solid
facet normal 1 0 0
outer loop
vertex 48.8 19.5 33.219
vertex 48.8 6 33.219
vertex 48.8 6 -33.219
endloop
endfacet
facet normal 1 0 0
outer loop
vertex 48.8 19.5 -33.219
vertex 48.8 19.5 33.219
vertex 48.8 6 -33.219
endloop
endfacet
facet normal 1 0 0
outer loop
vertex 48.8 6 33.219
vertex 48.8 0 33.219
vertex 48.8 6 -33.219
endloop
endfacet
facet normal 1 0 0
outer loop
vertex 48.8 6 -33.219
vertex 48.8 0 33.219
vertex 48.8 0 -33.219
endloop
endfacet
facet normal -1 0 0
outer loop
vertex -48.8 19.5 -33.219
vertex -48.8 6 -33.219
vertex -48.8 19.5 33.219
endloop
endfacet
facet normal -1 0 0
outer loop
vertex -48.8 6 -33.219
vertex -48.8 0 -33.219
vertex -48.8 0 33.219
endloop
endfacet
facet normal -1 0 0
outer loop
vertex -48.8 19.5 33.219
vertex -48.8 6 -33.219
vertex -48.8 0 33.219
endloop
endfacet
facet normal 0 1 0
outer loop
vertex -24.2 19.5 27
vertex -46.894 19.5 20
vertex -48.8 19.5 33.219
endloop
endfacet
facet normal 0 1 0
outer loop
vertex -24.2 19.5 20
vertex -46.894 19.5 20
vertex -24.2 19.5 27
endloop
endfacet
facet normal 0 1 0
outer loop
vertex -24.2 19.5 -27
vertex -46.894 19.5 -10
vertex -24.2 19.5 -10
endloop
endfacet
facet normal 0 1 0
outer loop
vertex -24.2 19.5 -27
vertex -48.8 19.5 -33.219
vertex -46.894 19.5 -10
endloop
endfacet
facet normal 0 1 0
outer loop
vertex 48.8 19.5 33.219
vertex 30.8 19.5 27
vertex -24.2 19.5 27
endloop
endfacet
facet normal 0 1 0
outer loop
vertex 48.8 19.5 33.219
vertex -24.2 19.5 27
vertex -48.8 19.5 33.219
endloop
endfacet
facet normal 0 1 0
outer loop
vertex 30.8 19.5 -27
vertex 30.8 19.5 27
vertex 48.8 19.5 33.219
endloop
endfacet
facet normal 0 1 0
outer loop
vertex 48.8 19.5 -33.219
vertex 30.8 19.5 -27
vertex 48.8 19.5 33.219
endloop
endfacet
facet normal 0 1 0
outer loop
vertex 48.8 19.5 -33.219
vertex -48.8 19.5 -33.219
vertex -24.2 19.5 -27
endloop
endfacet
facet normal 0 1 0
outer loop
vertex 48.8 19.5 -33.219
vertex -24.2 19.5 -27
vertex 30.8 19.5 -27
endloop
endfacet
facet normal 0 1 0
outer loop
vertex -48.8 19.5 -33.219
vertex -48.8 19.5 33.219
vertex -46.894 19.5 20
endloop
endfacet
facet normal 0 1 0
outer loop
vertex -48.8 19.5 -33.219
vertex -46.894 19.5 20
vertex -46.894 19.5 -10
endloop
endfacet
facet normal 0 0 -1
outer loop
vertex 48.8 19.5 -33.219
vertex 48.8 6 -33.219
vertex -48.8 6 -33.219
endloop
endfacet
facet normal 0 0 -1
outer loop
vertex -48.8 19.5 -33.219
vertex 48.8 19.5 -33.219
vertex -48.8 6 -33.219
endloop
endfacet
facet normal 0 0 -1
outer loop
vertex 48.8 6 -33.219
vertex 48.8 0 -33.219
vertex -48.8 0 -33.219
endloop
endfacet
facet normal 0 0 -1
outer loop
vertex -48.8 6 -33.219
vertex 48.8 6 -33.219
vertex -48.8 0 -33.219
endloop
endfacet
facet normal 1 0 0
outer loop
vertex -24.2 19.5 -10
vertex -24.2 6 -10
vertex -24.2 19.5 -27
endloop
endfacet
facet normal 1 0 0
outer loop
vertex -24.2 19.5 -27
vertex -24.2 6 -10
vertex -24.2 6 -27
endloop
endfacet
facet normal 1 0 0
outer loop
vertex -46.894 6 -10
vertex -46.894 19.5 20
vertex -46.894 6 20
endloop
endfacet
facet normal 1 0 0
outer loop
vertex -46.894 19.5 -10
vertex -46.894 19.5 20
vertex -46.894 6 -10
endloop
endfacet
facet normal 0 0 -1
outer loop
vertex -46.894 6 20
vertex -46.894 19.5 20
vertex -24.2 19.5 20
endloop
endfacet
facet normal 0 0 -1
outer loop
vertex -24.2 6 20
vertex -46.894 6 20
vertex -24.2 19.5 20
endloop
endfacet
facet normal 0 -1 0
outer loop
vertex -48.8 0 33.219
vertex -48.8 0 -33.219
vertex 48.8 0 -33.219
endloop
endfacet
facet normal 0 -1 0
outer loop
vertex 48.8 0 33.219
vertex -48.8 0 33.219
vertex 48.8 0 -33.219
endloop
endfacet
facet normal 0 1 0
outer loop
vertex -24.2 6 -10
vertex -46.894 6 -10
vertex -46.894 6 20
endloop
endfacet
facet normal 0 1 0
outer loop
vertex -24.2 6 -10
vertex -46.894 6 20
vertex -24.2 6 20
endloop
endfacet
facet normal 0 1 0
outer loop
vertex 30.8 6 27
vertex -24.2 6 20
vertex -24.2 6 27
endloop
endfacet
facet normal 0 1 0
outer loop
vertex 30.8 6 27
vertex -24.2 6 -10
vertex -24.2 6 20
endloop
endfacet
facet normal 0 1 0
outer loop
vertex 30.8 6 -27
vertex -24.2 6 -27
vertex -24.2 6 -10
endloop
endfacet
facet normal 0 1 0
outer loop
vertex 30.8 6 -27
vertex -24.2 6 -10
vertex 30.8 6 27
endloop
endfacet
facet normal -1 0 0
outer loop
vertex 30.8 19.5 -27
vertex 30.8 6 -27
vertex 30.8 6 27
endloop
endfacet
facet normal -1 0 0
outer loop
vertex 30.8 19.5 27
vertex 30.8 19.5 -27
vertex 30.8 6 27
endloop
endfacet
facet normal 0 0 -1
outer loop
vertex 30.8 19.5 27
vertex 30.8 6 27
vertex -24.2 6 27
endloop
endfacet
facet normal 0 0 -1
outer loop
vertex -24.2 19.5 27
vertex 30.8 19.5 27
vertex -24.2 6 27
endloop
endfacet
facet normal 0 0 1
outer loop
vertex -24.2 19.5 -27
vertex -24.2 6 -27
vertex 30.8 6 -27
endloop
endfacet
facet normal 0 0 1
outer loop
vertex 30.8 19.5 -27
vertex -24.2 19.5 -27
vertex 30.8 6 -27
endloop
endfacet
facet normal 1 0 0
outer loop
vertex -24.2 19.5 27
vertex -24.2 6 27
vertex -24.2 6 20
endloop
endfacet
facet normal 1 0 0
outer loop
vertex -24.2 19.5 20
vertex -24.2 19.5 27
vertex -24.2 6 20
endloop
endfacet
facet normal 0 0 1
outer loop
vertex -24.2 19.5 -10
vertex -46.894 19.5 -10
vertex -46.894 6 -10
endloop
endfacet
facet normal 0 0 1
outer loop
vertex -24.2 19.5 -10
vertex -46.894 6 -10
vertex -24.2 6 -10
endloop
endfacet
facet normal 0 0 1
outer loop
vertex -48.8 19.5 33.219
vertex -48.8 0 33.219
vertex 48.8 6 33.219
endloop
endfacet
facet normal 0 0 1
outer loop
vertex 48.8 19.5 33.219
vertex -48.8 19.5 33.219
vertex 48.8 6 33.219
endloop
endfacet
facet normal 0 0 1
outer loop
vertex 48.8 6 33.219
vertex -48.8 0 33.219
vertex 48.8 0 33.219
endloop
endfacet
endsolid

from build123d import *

# Parameters (mm, degrees)
SKETCH1_W           = 97.6
SKETCH1_H           = 66.43745389
BOSS_EXTRUDE1_DEPTH = 6
SKETCH4_W           = 24.6
SKETCH4_H           = 54
SKETCH4_H_2         = 6.218726945
SKETCH4_W_2         = 55
SKETCH4_W_3         = 18
BOSS_EXTRUDE2_DEPTH = 13.5
SKETCH5_W           = 34.693830492
SKETCH5_H           = 30
CUT_EXTRUDE1_DEPTH  = 13.5


with BuildPart() as part:
    # Sketch1 → Boss-Extrude1 (new body)
    with BuildSketch(Plane(origin=(0, 0, 0), x_dir=(1, 0, 0), z_dir=(0, 1, 0))):
        Rectangle(SKETCH1_W, SKETCH1_H)
    extrude(amount=BOSS_EXTRUDE1_DEPTH)

    # Sketch4 → Boss-Extrude2 (add)
    with BuildSketch(Plane(origin=(0, 6, 0), x_dir=(1, 0, 0), z_dir=(0, 1, 0))):
        with Locations((-36.5, 0)):
            Rectangle(SKETCH4_W, SKETCH4_H)
        with Locations((-36.5, -30.109363473)):
            Rectangle(SKETCH4_W, SKETCH4_H_2)
        with Locations((3.3, -30.109363473)):
            Rectangle(SKETCH4_W_2, SKETCH4_H_2)
        with Locations((39.8, -30.109363473)):
            Rectangle(SKETCH4_W_3, SKETCH4_H_2)
        with Locations((39.8, 0)):
            Rectangle(SKETCH4_W_3, SKETCH4_H)
        with Locations((39.8, 30.109363473)):
            Rectangle(SKETCH4_W_3, SKETCH4_H_2)
        with Locations((-36.5, 30.109363473)):
            Rectangle(SKETCH4_W, SKETCH4_H_2)
        with Locations((3.3, 30.109363473)):
            Rectangle(SKETCH4_W_2, SKETCH4_H_2)
    extrude(amount=BOSS_EXTRUDE2_DEPTH)

    # Sketch5 → Cut-Extrude1 (cut)
    with BuildSketch(Plane(origin=(0, 19.5, 0), x_dir=(1, 0, 0), z_dir=(0, 1, 0))):
        with Locations((-29.546650011, -5)):
            Rectangle(SKETCH5_W, SKETCH5_H)
    extrude(amount=-CUT_EXTRUDE1_DEPTH, mode=Mode.SUBTRACT)


solid = part.part
